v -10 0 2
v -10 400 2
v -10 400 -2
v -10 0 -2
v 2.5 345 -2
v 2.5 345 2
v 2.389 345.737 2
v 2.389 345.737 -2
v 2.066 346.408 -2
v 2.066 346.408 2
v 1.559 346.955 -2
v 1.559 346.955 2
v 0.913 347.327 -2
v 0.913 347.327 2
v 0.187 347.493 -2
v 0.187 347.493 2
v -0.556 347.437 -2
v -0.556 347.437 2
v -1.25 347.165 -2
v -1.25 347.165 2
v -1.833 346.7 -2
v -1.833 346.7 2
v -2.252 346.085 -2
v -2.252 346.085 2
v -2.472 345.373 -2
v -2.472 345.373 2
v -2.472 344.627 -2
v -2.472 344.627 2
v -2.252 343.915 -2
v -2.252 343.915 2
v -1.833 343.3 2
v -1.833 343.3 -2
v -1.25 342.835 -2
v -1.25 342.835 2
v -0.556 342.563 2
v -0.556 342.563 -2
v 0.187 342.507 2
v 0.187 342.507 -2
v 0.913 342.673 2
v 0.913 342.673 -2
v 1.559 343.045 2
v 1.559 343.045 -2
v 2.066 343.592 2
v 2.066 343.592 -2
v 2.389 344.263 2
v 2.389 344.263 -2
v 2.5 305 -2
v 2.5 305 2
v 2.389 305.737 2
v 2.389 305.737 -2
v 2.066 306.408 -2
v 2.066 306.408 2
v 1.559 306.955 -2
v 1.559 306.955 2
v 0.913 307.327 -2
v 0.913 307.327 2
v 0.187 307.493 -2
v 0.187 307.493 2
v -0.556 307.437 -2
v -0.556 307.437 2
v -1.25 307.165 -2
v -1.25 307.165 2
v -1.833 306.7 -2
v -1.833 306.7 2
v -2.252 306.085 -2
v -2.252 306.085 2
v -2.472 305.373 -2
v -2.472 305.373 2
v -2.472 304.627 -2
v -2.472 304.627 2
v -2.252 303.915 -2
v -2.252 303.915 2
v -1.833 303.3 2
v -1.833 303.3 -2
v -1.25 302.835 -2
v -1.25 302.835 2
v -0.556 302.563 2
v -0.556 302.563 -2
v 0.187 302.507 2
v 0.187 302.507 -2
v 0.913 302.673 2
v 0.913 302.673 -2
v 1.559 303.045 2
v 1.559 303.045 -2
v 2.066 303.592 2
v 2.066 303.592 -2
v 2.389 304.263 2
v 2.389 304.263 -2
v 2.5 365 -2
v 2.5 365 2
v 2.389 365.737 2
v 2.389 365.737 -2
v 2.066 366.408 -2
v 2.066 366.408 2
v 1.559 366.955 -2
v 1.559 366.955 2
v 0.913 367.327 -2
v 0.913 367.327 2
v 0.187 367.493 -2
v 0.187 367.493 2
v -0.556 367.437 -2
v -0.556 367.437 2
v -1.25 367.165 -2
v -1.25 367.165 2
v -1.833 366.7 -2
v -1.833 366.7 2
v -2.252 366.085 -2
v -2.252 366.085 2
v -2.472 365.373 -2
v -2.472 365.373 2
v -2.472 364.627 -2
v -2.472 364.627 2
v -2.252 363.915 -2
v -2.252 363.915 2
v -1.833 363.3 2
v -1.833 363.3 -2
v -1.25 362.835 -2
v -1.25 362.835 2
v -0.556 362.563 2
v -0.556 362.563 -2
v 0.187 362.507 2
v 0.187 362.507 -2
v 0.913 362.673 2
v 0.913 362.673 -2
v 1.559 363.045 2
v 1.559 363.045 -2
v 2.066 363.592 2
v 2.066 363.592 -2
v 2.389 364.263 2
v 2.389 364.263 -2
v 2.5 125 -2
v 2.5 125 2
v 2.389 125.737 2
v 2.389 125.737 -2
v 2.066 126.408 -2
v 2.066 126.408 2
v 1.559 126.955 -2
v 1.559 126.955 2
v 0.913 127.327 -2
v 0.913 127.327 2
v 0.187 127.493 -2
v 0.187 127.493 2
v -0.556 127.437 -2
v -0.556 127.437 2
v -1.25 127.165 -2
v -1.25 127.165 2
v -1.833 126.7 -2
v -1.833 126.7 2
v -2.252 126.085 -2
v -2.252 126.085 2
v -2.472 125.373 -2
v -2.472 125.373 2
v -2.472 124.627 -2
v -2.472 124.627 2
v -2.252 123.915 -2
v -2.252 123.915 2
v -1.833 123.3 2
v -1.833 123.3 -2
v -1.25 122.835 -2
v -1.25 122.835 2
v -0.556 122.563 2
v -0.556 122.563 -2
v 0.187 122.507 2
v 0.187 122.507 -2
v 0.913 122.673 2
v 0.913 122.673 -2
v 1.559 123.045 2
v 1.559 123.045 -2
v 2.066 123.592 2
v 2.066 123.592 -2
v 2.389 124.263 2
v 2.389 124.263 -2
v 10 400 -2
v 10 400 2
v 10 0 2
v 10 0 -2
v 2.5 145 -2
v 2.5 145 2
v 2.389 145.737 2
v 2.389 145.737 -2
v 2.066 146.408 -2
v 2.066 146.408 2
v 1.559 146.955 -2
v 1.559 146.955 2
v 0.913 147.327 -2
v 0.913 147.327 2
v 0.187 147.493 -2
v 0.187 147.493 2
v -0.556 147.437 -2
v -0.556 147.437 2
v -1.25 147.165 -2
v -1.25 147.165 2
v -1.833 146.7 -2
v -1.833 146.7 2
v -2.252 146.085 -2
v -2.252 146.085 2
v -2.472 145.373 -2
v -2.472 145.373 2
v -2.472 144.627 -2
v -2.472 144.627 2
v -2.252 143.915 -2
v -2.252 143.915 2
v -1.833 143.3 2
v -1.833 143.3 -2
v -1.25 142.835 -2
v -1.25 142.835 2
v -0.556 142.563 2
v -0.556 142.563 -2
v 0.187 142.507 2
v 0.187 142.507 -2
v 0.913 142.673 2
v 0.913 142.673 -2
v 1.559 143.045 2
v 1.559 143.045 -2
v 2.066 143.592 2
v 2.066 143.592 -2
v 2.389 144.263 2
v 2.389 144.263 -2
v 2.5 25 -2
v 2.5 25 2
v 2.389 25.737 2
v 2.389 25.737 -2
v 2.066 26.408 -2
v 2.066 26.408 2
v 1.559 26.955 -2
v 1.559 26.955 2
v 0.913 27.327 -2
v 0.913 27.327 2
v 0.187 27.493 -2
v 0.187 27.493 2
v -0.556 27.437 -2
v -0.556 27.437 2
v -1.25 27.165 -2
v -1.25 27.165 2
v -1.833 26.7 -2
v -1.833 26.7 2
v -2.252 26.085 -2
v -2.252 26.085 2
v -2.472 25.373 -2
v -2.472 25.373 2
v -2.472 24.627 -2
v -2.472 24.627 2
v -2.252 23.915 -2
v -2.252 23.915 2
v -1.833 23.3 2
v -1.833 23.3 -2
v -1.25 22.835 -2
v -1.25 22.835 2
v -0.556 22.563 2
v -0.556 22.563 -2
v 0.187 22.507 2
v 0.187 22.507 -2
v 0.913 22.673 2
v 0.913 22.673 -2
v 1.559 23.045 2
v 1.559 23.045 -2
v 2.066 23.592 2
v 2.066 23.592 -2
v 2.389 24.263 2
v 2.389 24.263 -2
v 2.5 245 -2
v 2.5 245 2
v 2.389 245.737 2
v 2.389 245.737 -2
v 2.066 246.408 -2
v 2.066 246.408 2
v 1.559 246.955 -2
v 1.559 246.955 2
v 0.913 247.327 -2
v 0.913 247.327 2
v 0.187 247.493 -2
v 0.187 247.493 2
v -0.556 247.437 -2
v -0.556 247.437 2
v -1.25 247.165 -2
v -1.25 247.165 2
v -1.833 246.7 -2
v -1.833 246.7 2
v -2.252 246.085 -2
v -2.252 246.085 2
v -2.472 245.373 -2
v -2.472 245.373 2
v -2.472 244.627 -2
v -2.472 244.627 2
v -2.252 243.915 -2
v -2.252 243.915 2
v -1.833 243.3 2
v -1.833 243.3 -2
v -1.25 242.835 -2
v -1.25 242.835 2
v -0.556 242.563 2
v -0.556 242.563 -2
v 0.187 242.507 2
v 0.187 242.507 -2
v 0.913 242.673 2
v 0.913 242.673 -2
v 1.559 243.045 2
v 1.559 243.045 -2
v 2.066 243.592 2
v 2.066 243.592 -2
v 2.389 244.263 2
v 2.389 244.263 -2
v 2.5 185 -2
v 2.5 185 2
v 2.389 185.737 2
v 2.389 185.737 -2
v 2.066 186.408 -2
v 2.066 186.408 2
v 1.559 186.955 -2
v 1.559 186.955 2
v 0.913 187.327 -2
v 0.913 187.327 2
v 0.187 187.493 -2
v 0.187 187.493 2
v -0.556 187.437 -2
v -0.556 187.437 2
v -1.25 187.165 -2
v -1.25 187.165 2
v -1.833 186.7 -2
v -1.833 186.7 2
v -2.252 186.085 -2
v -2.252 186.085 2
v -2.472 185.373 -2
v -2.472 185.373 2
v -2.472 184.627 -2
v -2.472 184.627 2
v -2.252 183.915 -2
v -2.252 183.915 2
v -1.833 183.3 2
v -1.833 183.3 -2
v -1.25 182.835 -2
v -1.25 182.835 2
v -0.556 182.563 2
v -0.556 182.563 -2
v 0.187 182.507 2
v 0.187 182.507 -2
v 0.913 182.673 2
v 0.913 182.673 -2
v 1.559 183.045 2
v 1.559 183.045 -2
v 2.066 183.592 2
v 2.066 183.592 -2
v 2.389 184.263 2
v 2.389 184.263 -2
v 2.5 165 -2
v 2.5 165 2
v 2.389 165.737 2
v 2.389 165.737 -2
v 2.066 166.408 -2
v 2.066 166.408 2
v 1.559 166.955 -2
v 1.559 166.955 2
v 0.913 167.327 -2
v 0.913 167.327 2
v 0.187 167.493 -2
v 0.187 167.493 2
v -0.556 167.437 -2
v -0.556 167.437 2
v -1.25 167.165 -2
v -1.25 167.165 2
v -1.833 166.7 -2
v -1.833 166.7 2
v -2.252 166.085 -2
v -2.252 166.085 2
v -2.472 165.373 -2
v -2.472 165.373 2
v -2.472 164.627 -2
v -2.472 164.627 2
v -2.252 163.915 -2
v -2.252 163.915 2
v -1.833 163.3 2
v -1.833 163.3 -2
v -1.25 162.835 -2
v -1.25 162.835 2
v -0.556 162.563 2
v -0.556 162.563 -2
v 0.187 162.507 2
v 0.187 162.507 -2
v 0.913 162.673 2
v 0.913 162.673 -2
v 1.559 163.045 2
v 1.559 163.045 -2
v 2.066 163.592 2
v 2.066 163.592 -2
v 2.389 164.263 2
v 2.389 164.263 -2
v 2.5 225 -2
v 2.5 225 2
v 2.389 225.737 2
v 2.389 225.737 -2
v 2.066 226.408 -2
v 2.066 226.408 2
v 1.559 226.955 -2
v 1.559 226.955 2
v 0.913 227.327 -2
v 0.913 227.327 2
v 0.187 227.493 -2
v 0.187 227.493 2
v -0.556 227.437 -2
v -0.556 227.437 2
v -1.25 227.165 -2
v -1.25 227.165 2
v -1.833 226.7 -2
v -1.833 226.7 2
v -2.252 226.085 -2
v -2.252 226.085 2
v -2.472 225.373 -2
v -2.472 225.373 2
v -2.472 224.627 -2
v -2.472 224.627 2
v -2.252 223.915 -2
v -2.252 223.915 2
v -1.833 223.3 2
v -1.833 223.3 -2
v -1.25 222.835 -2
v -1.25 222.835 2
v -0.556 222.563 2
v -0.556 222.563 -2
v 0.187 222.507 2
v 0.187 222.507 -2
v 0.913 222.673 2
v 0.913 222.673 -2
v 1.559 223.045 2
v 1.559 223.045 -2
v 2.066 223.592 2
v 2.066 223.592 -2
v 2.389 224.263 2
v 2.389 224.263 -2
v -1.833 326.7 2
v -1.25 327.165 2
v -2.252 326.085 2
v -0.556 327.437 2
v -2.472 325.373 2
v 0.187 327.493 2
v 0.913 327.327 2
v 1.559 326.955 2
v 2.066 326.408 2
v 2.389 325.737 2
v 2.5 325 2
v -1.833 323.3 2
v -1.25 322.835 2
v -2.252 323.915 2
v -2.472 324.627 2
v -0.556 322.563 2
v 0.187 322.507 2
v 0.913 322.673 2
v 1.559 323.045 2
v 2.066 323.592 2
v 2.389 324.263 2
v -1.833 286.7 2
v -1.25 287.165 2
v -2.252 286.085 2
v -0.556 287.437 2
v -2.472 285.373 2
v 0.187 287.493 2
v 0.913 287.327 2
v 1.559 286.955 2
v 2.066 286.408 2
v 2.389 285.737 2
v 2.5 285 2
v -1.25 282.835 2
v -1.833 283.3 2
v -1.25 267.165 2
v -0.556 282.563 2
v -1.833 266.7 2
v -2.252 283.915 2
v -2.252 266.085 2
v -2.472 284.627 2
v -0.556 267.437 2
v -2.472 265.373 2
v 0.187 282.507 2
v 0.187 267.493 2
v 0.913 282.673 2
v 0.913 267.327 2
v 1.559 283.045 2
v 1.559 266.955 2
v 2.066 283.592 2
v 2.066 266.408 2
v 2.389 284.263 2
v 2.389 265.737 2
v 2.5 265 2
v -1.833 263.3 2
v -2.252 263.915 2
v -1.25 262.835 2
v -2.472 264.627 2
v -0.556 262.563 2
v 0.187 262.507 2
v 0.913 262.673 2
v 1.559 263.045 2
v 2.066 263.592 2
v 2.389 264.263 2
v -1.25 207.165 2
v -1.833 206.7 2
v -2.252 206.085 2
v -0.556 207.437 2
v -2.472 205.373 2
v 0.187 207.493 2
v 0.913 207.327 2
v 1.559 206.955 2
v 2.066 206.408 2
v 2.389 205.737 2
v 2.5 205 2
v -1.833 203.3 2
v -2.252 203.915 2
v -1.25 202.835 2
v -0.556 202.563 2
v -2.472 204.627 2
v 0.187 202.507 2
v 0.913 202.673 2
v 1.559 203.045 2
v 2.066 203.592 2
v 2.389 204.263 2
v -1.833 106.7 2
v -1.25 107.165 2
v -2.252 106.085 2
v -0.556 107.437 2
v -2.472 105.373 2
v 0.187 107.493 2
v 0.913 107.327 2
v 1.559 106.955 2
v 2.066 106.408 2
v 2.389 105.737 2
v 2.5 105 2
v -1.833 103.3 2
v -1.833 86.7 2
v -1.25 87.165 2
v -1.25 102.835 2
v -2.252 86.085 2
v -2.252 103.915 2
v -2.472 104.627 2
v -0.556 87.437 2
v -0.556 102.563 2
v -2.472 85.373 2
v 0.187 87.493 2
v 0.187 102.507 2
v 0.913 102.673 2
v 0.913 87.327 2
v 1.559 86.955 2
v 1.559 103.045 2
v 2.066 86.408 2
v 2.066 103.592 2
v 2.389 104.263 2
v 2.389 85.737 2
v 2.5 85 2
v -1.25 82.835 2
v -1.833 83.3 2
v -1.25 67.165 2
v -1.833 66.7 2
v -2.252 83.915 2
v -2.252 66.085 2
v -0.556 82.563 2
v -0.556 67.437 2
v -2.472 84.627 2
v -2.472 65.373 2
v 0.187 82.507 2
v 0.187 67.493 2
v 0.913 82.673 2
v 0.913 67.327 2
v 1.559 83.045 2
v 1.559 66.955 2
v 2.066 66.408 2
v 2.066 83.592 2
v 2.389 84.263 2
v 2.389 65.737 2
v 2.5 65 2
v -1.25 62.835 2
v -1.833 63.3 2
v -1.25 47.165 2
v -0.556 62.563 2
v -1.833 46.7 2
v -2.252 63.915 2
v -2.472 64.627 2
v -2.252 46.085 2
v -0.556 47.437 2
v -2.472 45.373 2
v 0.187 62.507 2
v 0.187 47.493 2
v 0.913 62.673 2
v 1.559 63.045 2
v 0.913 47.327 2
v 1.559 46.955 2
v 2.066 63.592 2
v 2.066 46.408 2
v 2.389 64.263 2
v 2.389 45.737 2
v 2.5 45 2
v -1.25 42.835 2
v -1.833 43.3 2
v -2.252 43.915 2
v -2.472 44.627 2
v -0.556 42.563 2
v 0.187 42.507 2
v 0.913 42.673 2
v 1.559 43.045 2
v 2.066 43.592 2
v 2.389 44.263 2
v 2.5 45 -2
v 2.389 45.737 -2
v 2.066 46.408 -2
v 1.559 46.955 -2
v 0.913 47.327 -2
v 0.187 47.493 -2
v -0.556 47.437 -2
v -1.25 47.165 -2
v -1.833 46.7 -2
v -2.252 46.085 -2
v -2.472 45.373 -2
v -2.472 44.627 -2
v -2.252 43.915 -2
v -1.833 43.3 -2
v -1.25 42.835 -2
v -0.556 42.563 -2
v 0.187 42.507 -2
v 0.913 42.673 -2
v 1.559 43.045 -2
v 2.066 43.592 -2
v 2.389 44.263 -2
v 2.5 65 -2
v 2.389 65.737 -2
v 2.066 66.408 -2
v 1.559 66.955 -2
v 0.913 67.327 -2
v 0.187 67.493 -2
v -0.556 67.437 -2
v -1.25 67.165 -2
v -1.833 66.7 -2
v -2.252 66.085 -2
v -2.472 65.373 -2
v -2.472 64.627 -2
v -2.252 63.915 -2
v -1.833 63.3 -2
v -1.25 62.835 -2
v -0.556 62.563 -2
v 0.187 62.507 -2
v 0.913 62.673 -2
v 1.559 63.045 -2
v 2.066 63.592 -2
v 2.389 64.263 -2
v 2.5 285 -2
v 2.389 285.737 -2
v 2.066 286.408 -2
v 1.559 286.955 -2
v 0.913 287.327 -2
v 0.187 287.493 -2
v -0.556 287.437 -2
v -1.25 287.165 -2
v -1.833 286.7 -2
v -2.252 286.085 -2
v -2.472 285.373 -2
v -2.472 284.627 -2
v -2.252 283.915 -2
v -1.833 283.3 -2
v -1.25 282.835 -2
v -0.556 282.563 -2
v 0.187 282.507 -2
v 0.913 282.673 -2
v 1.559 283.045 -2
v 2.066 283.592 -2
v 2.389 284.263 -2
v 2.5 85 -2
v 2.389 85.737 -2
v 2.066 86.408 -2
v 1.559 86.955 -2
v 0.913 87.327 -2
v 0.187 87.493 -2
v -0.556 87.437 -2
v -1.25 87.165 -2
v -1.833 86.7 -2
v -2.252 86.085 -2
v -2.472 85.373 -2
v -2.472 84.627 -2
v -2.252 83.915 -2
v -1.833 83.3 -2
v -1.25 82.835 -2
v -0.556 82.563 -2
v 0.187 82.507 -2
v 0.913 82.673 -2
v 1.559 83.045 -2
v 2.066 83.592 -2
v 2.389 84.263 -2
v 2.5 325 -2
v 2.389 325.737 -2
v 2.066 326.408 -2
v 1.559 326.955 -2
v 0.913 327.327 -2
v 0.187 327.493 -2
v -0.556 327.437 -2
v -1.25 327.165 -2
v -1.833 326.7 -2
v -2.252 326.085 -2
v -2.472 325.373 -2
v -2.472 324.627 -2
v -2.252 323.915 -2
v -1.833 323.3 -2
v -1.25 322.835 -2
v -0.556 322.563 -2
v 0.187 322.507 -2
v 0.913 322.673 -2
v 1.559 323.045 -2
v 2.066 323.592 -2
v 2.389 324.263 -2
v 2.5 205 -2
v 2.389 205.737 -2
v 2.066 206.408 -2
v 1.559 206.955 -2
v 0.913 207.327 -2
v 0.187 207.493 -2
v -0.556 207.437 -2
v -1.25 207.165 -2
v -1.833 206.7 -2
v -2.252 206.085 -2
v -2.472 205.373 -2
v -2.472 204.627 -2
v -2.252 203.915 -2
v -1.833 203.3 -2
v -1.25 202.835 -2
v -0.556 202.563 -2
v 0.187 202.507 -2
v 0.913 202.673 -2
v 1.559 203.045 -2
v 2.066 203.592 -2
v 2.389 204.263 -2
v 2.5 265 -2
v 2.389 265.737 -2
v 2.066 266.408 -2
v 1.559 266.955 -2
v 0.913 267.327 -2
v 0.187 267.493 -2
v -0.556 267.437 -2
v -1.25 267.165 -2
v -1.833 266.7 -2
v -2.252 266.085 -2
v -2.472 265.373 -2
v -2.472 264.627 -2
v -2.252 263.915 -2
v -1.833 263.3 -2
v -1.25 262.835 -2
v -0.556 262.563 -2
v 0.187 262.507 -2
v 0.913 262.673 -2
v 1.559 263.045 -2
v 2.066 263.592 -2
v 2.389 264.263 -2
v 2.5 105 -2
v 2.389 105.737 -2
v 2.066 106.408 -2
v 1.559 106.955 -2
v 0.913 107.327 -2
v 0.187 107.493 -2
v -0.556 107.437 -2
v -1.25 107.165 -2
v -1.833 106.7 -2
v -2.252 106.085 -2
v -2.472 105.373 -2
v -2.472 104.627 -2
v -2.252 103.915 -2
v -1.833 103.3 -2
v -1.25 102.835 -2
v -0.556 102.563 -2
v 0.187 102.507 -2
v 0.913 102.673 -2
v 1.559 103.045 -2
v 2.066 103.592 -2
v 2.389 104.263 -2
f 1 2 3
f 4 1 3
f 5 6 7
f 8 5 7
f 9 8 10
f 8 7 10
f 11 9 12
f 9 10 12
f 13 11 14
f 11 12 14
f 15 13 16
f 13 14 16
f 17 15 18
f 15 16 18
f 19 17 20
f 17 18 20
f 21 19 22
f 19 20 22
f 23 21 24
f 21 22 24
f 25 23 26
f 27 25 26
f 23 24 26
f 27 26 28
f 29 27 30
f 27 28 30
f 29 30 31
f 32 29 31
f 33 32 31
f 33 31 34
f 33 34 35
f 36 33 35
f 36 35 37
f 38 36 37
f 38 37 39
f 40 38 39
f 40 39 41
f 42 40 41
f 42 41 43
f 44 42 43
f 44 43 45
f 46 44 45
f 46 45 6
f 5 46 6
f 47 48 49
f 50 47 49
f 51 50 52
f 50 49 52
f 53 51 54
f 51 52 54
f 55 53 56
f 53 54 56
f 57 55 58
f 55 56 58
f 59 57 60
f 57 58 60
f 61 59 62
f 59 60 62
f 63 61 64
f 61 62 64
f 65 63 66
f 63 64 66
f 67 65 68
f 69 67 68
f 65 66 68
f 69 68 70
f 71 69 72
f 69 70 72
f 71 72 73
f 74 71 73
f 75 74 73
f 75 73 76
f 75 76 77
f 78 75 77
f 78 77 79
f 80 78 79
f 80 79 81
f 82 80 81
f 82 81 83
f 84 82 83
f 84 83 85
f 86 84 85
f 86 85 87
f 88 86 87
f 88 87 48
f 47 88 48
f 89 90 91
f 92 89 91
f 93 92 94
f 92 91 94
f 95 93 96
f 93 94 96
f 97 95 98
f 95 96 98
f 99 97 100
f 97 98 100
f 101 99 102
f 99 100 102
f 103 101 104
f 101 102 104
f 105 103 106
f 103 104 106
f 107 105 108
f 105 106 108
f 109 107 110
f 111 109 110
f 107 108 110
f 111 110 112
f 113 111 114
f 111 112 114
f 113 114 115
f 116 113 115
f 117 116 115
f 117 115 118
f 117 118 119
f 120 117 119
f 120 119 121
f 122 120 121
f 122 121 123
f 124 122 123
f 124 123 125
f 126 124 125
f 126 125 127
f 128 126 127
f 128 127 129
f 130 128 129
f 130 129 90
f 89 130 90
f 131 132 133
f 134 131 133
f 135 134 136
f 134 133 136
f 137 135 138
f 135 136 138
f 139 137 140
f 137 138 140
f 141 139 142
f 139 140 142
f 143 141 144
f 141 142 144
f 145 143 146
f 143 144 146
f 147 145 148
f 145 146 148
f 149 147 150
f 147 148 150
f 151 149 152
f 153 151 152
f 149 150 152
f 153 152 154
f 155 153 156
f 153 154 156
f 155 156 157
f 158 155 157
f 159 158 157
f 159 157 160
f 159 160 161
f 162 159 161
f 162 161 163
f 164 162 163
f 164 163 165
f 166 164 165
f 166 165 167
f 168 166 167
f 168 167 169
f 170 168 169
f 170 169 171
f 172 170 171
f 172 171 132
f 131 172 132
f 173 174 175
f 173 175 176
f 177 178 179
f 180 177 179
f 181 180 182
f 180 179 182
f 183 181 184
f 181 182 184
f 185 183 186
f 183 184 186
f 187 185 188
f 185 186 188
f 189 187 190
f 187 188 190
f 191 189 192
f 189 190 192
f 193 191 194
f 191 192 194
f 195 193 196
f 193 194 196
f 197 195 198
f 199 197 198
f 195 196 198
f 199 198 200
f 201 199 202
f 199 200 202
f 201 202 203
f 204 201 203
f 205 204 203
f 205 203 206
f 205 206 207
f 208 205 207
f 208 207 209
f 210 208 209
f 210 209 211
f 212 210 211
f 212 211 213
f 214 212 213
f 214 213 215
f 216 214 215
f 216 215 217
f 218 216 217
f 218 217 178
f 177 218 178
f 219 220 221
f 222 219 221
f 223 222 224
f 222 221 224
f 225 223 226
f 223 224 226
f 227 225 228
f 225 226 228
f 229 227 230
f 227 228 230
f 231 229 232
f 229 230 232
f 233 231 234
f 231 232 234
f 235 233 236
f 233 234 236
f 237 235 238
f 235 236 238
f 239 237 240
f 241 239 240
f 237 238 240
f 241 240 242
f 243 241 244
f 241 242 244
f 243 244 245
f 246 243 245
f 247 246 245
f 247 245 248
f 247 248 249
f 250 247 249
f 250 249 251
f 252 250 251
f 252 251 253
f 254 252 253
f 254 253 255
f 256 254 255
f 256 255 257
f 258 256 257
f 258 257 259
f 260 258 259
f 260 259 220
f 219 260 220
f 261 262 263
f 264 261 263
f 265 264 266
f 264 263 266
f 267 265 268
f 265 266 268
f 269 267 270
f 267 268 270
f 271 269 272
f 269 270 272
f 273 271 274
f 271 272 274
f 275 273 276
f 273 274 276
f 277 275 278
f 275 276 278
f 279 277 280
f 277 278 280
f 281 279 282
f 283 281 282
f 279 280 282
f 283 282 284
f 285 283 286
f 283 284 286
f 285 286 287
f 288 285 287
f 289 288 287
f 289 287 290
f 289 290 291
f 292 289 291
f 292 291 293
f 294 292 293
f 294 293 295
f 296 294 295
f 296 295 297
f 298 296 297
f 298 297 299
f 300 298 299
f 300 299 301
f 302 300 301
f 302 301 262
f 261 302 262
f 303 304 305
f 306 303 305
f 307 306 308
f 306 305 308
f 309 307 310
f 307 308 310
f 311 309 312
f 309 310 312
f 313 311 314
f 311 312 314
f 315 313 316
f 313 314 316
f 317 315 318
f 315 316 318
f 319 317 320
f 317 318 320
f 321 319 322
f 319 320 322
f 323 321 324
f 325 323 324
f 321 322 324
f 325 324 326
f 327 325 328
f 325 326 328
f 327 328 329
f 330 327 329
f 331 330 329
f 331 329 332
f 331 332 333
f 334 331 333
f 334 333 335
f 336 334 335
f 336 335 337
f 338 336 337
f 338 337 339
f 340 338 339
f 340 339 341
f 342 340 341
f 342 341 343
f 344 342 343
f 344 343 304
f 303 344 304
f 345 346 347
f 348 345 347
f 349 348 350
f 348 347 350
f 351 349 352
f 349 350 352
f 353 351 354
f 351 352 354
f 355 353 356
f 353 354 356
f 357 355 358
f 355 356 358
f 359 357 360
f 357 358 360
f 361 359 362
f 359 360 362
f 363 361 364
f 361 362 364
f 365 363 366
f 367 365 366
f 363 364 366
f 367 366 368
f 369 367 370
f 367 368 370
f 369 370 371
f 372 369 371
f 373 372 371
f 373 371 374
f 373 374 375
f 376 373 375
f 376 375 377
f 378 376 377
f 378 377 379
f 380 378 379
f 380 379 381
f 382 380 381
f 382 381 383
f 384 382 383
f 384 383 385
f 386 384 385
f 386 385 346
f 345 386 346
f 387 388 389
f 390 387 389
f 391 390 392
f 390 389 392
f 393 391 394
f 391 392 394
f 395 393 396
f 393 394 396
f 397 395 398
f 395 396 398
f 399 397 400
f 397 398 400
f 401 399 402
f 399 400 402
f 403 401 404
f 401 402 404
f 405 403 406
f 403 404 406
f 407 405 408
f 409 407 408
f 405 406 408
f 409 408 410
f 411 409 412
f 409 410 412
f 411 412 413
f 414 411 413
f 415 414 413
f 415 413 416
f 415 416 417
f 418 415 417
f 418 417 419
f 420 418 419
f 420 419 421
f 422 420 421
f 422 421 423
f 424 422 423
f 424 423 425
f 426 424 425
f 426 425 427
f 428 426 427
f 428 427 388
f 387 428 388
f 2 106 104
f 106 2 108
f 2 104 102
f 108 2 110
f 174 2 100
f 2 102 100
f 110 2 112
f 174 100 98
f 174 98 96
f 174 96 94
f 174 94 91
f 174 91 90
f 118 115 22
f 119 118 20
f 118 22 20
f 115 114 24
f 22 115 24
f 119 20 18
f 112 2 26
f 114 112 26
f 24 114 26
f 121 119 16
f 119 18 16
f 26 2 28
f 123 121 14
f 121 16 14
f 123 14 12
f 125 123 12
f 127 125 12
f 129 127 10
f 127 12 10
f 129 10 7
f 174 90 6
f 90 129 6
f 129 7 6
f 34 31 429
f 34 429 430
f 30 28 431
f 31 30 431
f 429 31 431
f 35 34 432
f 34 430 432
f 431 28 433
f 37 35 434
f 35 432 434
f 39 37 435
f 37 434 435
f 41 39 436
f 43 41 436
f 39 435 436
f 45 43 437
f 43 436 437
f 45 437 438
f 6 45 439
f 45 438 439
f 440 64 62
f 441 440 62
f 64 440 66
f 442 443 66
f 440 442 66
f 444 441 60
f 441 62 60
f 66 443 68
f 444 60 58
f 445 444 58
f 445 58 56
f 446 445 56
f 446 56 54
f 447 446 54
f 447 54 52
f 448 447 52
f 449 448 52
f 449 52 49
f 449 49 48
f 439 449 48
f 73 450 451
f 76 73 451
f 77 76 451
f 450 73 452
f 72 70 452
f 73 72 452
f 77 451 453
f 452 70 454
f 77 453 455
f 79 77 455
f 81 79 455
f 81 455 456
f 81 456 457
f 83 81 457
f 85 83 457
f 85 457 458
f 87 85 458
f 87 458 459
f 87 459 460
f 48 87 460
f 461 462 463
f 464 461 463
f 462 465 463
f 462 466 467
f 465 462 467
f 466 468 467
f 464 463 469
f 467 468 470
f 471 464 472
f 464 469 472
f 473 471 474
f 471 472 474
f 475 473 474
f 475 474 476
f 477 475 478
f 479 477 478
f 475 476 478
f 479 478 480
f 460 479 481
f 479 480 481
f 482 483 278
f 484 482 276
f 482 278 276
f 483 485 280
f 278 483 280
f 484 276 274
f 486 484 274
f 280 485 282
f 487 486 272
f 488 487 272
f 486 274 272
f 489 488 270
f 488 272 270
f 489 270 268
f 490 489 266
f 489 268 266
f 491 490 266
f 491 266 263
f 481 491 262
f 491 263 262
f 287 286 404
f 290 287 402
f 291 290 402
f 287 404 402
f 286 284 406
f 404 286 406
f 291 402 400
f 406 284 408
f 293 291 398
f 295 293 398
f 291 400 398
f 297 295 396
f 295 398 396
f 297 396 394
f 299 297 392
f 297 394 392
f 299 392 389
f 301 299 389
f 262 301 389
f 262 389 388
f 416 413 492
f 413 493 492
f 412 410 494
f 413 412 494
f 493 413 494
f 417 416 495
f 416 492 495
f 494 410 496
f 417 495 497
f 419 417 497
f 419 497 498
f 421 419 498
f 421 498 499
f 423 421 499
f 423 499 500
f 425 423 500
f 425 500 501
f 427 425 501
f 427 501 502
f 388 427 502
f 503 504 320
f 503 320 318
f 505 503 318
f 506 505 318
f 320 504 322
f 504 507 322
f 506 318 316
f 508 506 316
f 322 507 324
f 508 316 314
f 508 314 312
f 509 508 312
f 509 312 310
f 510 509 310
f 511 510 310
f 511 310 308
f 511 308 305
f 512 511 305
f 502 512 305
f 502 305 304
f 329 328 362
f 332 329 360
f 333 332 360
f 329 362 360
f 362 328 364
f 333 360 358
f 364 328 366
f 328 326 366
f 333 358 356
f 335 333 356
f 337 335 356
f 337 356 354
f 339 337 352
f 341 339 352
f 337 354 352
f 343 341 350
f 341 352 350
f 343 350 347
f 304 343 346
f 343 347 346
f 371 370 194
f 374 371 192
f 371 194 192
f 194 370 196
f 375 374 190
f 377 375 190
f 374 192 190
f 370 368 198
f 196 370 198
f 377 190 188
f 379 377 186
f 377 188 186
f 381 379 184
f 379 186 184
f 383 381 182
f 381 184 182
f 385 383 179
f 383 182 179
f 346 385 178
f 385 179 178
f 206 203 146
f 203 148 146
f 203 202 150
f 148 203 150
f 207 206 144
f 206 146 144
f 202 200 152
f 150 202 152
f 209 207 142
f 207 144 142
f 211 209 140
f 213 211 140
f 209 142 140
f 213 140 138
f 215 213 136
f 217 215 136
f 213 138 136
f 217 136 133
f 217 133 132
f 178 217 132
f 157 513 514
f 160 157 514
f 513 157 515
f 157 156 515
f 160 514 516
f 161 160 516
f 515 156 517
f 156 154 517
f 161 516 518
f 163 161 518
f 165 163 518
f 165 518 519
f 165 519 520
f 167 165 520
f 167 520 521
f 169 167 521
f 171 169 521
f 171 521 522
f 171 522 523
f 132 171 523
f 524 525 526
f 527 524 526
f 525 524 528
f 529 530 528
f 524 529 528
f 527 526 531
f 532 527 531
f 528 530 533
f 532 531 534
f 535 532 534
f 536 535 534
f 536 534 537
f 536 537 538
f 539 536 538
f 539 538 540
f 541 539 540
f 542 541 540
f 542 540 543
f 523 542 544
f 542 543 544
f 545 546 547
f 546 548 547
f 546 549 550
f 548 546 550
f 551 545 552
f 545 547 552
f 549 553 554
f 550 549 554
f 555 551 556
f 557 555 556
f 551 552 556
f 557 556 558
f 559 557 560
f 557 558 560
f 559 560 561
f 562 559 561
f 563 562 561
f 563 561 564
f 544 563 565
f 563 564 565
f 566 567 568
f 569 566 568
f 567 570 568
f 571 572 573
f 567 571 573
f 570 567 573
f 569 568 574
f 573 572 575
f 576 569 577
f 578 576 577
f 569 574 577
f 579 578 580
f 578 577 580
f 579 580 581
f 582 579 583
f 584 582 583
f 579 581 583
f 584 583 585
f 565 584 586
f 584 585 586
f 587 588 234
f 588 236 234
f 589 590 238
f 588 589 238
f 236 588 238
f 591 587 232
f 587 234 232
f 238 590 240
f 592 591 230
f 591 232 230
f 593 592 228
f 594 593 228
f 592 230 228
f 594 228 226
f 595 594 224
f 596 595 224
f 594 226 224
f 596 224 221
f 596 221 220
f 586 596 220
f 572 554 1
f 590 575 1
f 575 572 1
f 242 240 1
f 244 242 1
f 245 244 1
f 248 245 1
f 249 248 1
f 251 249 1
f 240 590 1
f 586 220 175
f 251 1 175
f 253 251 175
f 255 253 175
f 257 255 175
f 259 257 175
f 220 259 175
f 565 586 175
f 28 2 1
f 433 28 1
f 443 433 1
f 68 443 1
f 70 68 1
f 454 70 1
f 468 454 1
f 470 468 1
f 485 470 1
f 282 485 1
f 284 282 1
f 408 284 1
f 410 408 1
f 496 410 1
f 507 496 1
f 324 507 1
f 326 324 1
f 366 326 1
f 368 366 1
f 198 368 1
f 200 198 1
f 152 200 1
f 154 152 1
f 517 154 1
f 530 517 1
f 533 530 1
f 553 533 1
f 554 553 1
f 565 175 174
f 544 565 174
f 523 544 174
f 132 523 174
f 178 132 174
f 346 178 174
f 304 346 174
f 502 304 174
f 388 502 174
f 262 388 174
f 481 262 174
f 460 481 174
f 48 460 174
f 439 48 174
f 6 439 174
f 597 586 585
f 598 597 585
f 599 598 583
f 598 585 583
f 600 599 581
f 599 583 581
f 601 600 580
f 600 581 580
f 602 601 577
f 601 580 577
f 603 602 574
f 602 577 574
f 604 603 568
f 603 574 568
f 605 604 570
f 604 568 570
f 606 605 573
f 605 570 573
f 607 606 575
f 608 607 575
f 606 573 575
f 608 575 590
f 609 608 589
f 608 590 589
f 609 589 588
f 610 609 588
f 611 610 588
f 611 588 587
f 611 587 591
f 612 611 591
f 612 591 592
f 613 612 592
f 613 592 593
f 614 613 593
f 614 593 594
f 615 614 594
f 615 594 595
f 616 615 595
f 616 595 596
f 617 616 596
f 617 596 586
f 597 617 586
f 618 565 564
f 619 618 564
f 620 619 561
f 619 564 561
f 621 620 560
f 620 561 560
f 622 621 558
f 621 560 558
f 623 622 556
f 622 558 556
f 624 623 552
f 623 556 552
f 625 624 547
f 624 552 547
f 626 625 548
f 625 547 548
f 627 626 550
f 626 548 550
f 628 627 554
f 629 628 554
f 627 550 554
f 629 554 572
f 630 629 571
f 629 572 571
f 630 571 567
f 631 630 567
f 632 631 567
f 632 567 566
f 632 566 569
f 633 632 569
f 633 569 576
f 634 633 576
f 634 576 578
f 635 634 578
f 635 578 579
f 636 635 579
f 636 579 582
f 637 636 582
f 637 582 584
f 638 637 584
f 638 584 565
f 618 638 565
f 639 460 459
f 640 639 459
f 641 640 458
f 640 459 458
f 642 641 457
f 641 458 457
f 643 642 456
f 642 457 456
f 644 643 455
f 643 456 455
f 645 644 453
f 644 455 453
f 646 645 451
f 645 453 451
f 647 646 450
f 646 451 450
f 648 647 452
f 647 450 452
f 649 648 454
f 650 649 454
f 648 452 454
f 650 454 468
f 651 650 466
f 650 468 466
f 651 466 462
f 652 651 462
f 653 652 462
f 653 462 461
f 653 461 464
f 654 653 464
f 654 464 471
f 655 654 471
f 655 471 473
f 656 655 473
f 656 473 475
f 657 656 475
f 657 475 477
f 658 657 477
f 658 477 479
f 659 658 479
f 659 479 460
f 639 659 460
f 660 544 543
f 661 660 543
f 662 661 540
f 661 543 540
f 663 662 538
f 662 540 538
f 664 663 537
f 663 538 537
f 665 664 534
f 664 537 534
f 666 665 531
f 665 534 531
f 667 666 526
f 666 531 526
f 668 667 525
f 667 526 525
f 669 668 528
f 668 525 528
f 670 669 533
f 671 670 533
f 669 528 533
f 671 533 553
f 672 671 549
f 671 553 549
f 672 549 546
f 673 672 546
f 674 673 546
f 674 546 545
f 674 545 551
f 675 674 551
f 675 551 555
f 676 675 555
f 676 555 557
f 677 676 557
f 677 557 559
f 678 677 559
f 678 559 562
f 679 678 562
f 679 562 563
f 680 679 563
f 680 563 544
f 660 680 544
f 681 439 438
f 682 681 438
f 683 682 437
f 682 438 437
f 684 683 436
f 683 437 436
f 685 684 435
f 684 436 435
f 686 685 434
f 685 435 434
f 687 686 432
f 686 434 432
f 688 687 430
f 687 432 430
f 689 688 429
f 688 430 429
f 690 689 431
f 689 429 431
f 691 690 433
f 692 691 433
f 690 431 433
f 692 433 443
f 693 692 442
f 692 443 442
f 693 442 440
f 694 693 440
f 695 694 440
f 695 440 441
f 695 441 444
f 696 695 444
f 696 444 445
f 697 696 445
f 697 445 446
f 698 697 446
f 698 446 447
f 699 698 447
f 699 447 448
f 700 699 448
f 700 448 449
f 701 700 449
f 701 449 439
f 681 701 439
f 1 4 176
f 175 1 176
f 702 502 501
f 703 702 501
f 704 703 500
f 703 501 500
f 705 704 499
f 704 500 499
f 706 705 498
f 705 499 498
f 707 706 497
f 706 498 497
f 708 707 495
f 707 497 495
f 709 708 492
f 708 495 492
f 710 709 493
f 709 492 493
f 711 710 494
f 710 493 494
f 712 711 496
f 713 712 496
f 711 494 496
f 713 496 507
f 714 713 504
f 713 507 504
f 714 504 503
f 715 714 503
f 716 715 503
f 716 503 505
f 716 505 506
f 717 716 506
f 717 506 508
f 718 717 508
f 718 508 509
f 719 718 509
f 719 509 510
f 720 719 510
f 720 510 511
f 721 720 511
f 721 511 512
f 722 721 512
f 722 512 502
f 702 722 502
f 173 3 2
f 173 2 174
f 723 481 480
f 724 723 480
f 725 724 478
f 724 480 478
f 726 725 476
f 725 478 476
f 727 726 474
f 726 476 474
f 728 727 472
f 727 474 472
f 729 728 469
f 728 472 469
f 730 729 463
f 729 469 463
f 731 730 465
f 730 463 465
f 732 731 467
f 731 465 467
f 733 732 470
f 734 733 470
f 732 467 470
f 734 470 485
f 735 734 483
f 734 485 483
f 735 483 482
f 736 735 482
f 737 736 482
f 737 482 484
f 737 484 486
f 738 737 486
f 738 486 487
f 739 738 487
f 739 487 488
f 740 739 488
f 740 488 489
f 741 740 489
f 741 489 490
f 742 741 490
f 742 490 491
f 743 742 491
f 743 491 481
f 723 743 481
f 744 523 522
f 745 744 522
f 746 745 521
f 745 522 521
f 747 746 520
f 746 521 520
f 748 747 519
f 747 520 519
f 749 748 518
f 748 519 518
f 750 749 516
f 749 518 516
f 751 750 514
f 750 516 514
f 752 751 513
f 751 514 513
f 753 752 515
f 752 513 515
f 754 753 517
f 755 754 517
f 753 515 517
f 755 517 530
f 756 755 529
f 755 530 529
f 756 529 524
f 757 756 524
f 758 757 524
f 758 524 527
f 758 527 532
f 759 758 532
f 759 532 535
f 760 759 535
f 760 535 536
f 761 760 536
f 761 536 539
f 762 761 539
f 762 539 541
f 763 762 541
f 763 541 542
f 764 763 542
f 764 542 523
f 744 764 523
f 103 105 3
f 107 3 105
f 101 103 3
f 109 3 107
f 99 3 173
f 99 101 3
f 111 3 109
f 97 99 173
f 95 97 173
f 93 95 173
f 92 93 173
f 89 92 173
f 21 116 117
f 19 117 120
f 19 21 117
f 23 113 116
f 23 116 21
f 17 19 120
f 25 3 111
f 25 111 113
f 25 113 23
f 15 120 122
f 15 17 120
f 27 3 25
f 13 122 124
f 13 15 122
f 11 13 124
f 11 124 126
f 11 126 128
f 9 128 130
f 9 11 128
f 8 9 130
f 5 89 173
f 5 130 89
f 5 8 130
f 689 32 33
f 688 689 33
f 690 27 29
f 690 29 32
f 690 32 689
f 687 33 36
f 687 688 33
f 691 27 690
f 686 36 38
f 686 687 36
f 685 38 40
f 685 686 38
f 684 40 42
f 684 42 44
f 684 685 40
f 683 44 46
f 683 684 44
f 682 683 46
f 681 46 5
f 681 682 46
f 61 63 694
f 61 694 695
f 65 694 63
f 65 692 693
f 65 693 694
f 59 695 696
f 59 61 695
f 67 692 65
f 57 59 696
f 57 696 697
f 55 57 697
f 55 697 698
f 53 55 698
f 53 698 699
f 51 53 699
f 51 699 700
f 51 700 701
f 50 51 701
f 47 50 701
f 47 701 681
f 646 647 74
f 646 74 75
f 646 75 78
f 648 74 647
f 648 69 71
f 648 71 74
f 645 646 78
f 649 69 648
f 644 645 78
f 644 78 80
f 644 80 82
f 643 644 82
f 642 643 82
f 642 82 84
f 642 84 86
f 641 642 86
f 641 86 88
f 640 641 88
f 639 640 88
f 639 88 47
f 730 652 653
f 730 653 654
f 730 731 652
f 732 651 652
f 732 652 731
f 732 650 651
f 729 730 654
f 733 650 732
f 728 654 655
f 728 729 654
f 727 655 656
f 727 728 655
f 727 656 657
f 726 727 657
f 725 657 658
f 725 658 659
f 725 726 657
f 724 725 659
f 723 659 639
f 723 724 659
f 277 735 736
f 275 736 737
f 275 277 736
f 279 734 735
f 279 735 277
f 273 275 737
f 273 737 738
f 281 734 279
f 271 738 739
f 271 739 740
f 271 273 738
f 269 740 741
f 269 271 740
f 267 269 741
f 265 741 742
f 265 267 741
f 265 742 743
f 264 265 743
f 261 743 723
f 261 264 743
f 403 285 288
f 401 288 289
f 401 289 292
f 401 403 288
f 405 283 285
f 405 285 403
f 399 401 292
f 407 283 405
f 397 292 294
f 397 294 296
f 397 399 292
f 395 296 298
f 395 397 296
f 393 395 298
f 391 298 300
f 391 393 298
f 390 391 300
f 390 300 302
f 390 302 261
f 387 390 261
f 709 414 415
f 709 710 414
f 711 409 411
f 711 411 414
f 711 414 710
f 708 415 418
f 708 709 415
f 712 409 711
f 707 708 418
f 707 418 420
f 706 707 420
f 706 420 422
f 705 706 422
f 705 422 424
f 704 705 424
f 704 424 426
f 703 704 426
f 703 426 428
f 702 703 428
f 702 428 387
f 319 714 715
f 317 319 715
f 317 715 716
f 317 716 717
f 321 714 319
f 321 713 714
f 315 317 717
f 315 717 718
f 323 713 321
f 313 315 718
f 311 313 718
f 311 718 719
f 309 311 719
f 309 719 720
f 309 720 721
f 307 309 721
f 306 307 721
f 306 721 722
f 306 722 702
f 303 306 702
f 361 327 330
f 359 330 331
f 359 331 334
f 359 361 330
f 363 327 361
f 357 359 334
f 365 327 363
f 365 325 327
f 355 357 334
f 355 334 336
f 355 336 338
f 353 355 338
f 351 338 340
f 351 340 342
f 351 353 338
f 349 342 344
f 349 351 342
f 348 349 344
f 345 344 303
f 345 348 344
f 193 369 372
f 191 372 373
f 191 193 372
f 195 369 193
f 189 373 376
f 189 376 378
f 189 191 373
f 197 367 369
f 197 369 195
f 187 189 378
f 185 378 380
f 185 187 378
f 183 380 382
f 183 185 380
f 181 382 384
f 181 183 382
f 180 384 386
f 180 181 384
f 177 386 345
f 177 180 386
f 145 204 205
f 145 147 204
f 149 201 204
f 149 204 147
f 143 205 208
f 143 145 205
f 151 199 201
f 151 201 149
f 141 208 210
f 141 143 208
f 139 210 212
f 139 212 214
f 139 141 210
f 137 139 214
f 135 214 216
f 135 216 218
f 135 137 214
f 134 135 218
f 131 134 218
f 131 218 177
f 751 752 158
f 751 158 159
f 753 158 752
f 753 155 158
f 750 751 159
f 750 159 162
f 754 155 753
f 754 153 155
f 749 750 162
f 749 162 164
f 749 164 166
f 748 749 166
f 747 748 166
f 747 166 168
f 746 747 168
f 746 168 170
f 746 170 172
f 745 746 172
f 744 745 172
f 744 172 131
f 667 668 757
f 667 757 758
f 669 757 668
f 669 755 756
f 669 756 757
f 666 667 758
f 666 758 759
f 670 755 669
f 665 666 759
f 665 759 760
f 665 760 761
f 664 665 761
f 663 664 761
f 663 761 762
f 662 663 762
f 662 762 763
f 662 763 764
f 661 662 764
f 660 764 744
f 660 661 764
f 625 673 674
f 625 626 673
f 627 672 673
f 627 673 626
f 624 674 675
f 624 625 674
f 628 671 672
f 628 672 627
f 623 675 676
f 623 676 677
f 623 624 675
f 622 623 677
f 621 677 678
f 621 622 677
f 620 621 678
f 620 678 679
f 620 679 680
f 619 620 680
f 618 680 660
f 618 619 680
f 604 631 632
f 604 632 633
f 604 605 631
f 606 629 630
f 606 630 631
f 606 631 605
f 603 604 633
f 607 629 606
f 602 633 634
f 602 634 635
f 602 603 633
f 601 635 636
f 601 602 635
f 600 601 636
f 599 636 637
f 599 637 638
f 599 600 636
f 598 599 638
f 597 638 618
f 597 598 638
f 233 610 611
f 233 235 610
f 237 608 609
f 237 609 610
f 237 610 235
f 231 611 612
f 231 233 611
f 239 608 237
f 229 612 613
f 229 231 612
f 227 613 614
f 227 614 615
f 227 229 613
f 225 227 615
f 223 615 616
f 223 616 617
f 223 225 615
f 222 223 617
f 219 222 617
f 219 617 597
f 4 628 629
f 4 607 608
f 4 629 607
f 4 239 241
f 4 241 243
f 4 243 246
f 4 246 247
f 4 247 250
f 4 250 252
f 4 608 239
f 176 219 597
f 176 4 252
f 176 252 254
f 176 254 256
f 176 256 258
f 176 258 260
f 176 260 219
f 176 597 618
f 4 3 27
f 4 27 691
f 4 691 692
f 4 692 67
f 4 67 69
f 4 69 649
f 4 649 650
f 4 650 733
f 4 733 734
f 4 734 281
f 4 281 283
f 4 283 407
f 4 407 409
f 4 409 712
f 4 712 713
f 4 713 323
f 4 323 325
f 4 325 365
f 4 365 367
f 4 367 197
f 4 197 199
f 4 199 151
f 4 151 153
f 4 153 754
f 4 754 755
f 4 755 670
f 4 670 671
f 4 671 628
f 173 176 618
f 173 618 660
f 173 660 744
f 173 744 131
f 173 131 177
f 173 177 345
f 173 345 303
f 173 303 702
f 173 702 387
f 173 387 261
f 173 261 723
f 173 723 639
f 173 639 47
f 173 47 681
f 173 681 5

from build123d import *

# Parameters (mm, degrees)
SKETCH_1_W          = 20
SKETCH_1_H          = 4
EXTRUDE_1_DEPTH     = 400
SKETCH_2_R          = 2.5
CUT_EXTRUDE_1_DEPTH = 5


with BuildPart() as part:
    # Эскиз1 → Бобышка-Вытянуть1 (new body)
    with BuildSketch(Plane(origin=(0, 0, 0), x_dir=(1, 0, 0), z_dir=(0, 1, 0))):
        Rectangle(SKETCH_1_W, SKETCH_1_H)
    extrude(amount=EXTRUDE_1_DEPTH)

    # Эскиз2 → Вырез-Вытянуть1 (cut, through all)
    with BuildSketch(Plane.XY.offset(2)):
        with Locations((0, 25)):
            Circle(SKETCH_2_R)
        with Locations((0, 45)):
            Circle(SKETCH_2_R)
        with Locations((0, 65)):
            Circle(SKETCH_2_R)
        with Locations((0, 85)):
            Circle(SKETCH_2_R)
        with Locations((0, 105)):
            Circle(SKETCH_2_R)
        with Locations((0, 125)):
            Circle(SKETCH_2_R)
        with Locations((0, 145)):
            Circle(SKETCH_2_R)
        with Locations((0, 165)):
            Circle(SKETCH_2_R)
        with Locations((0, 185)):
            Circle(SKETCH_2_R)
        with Locations((0, 205)):
            Circle(SKETCH_2_R)
        with Locations((0, 225)):
            Circle(SKETCH_2_R)
        with Locations((0, 245)):
            Circle(SKETCH_2_R)
        with Locations((0, 265)):
            Circle(SKETCH_2_R)
        with Locations((0, 285)):
            Circle(SKETCH_2_R)
        with Locations((0, 305)):
            Circle(SKETCH_2_R)
        with Locations((0, 325)):
            Circle(SKETCH_2_R)
        with Locations((0, 345)):
            Circle(SKETCH_2_R)
        with Locations((0, 365)):
            Circle(SKETCH_2_R)
    extrude(amount=-CUT_EXTRUDE_1_DEPTH, mode=Mode.SUBTRACT)


solid = part.part
